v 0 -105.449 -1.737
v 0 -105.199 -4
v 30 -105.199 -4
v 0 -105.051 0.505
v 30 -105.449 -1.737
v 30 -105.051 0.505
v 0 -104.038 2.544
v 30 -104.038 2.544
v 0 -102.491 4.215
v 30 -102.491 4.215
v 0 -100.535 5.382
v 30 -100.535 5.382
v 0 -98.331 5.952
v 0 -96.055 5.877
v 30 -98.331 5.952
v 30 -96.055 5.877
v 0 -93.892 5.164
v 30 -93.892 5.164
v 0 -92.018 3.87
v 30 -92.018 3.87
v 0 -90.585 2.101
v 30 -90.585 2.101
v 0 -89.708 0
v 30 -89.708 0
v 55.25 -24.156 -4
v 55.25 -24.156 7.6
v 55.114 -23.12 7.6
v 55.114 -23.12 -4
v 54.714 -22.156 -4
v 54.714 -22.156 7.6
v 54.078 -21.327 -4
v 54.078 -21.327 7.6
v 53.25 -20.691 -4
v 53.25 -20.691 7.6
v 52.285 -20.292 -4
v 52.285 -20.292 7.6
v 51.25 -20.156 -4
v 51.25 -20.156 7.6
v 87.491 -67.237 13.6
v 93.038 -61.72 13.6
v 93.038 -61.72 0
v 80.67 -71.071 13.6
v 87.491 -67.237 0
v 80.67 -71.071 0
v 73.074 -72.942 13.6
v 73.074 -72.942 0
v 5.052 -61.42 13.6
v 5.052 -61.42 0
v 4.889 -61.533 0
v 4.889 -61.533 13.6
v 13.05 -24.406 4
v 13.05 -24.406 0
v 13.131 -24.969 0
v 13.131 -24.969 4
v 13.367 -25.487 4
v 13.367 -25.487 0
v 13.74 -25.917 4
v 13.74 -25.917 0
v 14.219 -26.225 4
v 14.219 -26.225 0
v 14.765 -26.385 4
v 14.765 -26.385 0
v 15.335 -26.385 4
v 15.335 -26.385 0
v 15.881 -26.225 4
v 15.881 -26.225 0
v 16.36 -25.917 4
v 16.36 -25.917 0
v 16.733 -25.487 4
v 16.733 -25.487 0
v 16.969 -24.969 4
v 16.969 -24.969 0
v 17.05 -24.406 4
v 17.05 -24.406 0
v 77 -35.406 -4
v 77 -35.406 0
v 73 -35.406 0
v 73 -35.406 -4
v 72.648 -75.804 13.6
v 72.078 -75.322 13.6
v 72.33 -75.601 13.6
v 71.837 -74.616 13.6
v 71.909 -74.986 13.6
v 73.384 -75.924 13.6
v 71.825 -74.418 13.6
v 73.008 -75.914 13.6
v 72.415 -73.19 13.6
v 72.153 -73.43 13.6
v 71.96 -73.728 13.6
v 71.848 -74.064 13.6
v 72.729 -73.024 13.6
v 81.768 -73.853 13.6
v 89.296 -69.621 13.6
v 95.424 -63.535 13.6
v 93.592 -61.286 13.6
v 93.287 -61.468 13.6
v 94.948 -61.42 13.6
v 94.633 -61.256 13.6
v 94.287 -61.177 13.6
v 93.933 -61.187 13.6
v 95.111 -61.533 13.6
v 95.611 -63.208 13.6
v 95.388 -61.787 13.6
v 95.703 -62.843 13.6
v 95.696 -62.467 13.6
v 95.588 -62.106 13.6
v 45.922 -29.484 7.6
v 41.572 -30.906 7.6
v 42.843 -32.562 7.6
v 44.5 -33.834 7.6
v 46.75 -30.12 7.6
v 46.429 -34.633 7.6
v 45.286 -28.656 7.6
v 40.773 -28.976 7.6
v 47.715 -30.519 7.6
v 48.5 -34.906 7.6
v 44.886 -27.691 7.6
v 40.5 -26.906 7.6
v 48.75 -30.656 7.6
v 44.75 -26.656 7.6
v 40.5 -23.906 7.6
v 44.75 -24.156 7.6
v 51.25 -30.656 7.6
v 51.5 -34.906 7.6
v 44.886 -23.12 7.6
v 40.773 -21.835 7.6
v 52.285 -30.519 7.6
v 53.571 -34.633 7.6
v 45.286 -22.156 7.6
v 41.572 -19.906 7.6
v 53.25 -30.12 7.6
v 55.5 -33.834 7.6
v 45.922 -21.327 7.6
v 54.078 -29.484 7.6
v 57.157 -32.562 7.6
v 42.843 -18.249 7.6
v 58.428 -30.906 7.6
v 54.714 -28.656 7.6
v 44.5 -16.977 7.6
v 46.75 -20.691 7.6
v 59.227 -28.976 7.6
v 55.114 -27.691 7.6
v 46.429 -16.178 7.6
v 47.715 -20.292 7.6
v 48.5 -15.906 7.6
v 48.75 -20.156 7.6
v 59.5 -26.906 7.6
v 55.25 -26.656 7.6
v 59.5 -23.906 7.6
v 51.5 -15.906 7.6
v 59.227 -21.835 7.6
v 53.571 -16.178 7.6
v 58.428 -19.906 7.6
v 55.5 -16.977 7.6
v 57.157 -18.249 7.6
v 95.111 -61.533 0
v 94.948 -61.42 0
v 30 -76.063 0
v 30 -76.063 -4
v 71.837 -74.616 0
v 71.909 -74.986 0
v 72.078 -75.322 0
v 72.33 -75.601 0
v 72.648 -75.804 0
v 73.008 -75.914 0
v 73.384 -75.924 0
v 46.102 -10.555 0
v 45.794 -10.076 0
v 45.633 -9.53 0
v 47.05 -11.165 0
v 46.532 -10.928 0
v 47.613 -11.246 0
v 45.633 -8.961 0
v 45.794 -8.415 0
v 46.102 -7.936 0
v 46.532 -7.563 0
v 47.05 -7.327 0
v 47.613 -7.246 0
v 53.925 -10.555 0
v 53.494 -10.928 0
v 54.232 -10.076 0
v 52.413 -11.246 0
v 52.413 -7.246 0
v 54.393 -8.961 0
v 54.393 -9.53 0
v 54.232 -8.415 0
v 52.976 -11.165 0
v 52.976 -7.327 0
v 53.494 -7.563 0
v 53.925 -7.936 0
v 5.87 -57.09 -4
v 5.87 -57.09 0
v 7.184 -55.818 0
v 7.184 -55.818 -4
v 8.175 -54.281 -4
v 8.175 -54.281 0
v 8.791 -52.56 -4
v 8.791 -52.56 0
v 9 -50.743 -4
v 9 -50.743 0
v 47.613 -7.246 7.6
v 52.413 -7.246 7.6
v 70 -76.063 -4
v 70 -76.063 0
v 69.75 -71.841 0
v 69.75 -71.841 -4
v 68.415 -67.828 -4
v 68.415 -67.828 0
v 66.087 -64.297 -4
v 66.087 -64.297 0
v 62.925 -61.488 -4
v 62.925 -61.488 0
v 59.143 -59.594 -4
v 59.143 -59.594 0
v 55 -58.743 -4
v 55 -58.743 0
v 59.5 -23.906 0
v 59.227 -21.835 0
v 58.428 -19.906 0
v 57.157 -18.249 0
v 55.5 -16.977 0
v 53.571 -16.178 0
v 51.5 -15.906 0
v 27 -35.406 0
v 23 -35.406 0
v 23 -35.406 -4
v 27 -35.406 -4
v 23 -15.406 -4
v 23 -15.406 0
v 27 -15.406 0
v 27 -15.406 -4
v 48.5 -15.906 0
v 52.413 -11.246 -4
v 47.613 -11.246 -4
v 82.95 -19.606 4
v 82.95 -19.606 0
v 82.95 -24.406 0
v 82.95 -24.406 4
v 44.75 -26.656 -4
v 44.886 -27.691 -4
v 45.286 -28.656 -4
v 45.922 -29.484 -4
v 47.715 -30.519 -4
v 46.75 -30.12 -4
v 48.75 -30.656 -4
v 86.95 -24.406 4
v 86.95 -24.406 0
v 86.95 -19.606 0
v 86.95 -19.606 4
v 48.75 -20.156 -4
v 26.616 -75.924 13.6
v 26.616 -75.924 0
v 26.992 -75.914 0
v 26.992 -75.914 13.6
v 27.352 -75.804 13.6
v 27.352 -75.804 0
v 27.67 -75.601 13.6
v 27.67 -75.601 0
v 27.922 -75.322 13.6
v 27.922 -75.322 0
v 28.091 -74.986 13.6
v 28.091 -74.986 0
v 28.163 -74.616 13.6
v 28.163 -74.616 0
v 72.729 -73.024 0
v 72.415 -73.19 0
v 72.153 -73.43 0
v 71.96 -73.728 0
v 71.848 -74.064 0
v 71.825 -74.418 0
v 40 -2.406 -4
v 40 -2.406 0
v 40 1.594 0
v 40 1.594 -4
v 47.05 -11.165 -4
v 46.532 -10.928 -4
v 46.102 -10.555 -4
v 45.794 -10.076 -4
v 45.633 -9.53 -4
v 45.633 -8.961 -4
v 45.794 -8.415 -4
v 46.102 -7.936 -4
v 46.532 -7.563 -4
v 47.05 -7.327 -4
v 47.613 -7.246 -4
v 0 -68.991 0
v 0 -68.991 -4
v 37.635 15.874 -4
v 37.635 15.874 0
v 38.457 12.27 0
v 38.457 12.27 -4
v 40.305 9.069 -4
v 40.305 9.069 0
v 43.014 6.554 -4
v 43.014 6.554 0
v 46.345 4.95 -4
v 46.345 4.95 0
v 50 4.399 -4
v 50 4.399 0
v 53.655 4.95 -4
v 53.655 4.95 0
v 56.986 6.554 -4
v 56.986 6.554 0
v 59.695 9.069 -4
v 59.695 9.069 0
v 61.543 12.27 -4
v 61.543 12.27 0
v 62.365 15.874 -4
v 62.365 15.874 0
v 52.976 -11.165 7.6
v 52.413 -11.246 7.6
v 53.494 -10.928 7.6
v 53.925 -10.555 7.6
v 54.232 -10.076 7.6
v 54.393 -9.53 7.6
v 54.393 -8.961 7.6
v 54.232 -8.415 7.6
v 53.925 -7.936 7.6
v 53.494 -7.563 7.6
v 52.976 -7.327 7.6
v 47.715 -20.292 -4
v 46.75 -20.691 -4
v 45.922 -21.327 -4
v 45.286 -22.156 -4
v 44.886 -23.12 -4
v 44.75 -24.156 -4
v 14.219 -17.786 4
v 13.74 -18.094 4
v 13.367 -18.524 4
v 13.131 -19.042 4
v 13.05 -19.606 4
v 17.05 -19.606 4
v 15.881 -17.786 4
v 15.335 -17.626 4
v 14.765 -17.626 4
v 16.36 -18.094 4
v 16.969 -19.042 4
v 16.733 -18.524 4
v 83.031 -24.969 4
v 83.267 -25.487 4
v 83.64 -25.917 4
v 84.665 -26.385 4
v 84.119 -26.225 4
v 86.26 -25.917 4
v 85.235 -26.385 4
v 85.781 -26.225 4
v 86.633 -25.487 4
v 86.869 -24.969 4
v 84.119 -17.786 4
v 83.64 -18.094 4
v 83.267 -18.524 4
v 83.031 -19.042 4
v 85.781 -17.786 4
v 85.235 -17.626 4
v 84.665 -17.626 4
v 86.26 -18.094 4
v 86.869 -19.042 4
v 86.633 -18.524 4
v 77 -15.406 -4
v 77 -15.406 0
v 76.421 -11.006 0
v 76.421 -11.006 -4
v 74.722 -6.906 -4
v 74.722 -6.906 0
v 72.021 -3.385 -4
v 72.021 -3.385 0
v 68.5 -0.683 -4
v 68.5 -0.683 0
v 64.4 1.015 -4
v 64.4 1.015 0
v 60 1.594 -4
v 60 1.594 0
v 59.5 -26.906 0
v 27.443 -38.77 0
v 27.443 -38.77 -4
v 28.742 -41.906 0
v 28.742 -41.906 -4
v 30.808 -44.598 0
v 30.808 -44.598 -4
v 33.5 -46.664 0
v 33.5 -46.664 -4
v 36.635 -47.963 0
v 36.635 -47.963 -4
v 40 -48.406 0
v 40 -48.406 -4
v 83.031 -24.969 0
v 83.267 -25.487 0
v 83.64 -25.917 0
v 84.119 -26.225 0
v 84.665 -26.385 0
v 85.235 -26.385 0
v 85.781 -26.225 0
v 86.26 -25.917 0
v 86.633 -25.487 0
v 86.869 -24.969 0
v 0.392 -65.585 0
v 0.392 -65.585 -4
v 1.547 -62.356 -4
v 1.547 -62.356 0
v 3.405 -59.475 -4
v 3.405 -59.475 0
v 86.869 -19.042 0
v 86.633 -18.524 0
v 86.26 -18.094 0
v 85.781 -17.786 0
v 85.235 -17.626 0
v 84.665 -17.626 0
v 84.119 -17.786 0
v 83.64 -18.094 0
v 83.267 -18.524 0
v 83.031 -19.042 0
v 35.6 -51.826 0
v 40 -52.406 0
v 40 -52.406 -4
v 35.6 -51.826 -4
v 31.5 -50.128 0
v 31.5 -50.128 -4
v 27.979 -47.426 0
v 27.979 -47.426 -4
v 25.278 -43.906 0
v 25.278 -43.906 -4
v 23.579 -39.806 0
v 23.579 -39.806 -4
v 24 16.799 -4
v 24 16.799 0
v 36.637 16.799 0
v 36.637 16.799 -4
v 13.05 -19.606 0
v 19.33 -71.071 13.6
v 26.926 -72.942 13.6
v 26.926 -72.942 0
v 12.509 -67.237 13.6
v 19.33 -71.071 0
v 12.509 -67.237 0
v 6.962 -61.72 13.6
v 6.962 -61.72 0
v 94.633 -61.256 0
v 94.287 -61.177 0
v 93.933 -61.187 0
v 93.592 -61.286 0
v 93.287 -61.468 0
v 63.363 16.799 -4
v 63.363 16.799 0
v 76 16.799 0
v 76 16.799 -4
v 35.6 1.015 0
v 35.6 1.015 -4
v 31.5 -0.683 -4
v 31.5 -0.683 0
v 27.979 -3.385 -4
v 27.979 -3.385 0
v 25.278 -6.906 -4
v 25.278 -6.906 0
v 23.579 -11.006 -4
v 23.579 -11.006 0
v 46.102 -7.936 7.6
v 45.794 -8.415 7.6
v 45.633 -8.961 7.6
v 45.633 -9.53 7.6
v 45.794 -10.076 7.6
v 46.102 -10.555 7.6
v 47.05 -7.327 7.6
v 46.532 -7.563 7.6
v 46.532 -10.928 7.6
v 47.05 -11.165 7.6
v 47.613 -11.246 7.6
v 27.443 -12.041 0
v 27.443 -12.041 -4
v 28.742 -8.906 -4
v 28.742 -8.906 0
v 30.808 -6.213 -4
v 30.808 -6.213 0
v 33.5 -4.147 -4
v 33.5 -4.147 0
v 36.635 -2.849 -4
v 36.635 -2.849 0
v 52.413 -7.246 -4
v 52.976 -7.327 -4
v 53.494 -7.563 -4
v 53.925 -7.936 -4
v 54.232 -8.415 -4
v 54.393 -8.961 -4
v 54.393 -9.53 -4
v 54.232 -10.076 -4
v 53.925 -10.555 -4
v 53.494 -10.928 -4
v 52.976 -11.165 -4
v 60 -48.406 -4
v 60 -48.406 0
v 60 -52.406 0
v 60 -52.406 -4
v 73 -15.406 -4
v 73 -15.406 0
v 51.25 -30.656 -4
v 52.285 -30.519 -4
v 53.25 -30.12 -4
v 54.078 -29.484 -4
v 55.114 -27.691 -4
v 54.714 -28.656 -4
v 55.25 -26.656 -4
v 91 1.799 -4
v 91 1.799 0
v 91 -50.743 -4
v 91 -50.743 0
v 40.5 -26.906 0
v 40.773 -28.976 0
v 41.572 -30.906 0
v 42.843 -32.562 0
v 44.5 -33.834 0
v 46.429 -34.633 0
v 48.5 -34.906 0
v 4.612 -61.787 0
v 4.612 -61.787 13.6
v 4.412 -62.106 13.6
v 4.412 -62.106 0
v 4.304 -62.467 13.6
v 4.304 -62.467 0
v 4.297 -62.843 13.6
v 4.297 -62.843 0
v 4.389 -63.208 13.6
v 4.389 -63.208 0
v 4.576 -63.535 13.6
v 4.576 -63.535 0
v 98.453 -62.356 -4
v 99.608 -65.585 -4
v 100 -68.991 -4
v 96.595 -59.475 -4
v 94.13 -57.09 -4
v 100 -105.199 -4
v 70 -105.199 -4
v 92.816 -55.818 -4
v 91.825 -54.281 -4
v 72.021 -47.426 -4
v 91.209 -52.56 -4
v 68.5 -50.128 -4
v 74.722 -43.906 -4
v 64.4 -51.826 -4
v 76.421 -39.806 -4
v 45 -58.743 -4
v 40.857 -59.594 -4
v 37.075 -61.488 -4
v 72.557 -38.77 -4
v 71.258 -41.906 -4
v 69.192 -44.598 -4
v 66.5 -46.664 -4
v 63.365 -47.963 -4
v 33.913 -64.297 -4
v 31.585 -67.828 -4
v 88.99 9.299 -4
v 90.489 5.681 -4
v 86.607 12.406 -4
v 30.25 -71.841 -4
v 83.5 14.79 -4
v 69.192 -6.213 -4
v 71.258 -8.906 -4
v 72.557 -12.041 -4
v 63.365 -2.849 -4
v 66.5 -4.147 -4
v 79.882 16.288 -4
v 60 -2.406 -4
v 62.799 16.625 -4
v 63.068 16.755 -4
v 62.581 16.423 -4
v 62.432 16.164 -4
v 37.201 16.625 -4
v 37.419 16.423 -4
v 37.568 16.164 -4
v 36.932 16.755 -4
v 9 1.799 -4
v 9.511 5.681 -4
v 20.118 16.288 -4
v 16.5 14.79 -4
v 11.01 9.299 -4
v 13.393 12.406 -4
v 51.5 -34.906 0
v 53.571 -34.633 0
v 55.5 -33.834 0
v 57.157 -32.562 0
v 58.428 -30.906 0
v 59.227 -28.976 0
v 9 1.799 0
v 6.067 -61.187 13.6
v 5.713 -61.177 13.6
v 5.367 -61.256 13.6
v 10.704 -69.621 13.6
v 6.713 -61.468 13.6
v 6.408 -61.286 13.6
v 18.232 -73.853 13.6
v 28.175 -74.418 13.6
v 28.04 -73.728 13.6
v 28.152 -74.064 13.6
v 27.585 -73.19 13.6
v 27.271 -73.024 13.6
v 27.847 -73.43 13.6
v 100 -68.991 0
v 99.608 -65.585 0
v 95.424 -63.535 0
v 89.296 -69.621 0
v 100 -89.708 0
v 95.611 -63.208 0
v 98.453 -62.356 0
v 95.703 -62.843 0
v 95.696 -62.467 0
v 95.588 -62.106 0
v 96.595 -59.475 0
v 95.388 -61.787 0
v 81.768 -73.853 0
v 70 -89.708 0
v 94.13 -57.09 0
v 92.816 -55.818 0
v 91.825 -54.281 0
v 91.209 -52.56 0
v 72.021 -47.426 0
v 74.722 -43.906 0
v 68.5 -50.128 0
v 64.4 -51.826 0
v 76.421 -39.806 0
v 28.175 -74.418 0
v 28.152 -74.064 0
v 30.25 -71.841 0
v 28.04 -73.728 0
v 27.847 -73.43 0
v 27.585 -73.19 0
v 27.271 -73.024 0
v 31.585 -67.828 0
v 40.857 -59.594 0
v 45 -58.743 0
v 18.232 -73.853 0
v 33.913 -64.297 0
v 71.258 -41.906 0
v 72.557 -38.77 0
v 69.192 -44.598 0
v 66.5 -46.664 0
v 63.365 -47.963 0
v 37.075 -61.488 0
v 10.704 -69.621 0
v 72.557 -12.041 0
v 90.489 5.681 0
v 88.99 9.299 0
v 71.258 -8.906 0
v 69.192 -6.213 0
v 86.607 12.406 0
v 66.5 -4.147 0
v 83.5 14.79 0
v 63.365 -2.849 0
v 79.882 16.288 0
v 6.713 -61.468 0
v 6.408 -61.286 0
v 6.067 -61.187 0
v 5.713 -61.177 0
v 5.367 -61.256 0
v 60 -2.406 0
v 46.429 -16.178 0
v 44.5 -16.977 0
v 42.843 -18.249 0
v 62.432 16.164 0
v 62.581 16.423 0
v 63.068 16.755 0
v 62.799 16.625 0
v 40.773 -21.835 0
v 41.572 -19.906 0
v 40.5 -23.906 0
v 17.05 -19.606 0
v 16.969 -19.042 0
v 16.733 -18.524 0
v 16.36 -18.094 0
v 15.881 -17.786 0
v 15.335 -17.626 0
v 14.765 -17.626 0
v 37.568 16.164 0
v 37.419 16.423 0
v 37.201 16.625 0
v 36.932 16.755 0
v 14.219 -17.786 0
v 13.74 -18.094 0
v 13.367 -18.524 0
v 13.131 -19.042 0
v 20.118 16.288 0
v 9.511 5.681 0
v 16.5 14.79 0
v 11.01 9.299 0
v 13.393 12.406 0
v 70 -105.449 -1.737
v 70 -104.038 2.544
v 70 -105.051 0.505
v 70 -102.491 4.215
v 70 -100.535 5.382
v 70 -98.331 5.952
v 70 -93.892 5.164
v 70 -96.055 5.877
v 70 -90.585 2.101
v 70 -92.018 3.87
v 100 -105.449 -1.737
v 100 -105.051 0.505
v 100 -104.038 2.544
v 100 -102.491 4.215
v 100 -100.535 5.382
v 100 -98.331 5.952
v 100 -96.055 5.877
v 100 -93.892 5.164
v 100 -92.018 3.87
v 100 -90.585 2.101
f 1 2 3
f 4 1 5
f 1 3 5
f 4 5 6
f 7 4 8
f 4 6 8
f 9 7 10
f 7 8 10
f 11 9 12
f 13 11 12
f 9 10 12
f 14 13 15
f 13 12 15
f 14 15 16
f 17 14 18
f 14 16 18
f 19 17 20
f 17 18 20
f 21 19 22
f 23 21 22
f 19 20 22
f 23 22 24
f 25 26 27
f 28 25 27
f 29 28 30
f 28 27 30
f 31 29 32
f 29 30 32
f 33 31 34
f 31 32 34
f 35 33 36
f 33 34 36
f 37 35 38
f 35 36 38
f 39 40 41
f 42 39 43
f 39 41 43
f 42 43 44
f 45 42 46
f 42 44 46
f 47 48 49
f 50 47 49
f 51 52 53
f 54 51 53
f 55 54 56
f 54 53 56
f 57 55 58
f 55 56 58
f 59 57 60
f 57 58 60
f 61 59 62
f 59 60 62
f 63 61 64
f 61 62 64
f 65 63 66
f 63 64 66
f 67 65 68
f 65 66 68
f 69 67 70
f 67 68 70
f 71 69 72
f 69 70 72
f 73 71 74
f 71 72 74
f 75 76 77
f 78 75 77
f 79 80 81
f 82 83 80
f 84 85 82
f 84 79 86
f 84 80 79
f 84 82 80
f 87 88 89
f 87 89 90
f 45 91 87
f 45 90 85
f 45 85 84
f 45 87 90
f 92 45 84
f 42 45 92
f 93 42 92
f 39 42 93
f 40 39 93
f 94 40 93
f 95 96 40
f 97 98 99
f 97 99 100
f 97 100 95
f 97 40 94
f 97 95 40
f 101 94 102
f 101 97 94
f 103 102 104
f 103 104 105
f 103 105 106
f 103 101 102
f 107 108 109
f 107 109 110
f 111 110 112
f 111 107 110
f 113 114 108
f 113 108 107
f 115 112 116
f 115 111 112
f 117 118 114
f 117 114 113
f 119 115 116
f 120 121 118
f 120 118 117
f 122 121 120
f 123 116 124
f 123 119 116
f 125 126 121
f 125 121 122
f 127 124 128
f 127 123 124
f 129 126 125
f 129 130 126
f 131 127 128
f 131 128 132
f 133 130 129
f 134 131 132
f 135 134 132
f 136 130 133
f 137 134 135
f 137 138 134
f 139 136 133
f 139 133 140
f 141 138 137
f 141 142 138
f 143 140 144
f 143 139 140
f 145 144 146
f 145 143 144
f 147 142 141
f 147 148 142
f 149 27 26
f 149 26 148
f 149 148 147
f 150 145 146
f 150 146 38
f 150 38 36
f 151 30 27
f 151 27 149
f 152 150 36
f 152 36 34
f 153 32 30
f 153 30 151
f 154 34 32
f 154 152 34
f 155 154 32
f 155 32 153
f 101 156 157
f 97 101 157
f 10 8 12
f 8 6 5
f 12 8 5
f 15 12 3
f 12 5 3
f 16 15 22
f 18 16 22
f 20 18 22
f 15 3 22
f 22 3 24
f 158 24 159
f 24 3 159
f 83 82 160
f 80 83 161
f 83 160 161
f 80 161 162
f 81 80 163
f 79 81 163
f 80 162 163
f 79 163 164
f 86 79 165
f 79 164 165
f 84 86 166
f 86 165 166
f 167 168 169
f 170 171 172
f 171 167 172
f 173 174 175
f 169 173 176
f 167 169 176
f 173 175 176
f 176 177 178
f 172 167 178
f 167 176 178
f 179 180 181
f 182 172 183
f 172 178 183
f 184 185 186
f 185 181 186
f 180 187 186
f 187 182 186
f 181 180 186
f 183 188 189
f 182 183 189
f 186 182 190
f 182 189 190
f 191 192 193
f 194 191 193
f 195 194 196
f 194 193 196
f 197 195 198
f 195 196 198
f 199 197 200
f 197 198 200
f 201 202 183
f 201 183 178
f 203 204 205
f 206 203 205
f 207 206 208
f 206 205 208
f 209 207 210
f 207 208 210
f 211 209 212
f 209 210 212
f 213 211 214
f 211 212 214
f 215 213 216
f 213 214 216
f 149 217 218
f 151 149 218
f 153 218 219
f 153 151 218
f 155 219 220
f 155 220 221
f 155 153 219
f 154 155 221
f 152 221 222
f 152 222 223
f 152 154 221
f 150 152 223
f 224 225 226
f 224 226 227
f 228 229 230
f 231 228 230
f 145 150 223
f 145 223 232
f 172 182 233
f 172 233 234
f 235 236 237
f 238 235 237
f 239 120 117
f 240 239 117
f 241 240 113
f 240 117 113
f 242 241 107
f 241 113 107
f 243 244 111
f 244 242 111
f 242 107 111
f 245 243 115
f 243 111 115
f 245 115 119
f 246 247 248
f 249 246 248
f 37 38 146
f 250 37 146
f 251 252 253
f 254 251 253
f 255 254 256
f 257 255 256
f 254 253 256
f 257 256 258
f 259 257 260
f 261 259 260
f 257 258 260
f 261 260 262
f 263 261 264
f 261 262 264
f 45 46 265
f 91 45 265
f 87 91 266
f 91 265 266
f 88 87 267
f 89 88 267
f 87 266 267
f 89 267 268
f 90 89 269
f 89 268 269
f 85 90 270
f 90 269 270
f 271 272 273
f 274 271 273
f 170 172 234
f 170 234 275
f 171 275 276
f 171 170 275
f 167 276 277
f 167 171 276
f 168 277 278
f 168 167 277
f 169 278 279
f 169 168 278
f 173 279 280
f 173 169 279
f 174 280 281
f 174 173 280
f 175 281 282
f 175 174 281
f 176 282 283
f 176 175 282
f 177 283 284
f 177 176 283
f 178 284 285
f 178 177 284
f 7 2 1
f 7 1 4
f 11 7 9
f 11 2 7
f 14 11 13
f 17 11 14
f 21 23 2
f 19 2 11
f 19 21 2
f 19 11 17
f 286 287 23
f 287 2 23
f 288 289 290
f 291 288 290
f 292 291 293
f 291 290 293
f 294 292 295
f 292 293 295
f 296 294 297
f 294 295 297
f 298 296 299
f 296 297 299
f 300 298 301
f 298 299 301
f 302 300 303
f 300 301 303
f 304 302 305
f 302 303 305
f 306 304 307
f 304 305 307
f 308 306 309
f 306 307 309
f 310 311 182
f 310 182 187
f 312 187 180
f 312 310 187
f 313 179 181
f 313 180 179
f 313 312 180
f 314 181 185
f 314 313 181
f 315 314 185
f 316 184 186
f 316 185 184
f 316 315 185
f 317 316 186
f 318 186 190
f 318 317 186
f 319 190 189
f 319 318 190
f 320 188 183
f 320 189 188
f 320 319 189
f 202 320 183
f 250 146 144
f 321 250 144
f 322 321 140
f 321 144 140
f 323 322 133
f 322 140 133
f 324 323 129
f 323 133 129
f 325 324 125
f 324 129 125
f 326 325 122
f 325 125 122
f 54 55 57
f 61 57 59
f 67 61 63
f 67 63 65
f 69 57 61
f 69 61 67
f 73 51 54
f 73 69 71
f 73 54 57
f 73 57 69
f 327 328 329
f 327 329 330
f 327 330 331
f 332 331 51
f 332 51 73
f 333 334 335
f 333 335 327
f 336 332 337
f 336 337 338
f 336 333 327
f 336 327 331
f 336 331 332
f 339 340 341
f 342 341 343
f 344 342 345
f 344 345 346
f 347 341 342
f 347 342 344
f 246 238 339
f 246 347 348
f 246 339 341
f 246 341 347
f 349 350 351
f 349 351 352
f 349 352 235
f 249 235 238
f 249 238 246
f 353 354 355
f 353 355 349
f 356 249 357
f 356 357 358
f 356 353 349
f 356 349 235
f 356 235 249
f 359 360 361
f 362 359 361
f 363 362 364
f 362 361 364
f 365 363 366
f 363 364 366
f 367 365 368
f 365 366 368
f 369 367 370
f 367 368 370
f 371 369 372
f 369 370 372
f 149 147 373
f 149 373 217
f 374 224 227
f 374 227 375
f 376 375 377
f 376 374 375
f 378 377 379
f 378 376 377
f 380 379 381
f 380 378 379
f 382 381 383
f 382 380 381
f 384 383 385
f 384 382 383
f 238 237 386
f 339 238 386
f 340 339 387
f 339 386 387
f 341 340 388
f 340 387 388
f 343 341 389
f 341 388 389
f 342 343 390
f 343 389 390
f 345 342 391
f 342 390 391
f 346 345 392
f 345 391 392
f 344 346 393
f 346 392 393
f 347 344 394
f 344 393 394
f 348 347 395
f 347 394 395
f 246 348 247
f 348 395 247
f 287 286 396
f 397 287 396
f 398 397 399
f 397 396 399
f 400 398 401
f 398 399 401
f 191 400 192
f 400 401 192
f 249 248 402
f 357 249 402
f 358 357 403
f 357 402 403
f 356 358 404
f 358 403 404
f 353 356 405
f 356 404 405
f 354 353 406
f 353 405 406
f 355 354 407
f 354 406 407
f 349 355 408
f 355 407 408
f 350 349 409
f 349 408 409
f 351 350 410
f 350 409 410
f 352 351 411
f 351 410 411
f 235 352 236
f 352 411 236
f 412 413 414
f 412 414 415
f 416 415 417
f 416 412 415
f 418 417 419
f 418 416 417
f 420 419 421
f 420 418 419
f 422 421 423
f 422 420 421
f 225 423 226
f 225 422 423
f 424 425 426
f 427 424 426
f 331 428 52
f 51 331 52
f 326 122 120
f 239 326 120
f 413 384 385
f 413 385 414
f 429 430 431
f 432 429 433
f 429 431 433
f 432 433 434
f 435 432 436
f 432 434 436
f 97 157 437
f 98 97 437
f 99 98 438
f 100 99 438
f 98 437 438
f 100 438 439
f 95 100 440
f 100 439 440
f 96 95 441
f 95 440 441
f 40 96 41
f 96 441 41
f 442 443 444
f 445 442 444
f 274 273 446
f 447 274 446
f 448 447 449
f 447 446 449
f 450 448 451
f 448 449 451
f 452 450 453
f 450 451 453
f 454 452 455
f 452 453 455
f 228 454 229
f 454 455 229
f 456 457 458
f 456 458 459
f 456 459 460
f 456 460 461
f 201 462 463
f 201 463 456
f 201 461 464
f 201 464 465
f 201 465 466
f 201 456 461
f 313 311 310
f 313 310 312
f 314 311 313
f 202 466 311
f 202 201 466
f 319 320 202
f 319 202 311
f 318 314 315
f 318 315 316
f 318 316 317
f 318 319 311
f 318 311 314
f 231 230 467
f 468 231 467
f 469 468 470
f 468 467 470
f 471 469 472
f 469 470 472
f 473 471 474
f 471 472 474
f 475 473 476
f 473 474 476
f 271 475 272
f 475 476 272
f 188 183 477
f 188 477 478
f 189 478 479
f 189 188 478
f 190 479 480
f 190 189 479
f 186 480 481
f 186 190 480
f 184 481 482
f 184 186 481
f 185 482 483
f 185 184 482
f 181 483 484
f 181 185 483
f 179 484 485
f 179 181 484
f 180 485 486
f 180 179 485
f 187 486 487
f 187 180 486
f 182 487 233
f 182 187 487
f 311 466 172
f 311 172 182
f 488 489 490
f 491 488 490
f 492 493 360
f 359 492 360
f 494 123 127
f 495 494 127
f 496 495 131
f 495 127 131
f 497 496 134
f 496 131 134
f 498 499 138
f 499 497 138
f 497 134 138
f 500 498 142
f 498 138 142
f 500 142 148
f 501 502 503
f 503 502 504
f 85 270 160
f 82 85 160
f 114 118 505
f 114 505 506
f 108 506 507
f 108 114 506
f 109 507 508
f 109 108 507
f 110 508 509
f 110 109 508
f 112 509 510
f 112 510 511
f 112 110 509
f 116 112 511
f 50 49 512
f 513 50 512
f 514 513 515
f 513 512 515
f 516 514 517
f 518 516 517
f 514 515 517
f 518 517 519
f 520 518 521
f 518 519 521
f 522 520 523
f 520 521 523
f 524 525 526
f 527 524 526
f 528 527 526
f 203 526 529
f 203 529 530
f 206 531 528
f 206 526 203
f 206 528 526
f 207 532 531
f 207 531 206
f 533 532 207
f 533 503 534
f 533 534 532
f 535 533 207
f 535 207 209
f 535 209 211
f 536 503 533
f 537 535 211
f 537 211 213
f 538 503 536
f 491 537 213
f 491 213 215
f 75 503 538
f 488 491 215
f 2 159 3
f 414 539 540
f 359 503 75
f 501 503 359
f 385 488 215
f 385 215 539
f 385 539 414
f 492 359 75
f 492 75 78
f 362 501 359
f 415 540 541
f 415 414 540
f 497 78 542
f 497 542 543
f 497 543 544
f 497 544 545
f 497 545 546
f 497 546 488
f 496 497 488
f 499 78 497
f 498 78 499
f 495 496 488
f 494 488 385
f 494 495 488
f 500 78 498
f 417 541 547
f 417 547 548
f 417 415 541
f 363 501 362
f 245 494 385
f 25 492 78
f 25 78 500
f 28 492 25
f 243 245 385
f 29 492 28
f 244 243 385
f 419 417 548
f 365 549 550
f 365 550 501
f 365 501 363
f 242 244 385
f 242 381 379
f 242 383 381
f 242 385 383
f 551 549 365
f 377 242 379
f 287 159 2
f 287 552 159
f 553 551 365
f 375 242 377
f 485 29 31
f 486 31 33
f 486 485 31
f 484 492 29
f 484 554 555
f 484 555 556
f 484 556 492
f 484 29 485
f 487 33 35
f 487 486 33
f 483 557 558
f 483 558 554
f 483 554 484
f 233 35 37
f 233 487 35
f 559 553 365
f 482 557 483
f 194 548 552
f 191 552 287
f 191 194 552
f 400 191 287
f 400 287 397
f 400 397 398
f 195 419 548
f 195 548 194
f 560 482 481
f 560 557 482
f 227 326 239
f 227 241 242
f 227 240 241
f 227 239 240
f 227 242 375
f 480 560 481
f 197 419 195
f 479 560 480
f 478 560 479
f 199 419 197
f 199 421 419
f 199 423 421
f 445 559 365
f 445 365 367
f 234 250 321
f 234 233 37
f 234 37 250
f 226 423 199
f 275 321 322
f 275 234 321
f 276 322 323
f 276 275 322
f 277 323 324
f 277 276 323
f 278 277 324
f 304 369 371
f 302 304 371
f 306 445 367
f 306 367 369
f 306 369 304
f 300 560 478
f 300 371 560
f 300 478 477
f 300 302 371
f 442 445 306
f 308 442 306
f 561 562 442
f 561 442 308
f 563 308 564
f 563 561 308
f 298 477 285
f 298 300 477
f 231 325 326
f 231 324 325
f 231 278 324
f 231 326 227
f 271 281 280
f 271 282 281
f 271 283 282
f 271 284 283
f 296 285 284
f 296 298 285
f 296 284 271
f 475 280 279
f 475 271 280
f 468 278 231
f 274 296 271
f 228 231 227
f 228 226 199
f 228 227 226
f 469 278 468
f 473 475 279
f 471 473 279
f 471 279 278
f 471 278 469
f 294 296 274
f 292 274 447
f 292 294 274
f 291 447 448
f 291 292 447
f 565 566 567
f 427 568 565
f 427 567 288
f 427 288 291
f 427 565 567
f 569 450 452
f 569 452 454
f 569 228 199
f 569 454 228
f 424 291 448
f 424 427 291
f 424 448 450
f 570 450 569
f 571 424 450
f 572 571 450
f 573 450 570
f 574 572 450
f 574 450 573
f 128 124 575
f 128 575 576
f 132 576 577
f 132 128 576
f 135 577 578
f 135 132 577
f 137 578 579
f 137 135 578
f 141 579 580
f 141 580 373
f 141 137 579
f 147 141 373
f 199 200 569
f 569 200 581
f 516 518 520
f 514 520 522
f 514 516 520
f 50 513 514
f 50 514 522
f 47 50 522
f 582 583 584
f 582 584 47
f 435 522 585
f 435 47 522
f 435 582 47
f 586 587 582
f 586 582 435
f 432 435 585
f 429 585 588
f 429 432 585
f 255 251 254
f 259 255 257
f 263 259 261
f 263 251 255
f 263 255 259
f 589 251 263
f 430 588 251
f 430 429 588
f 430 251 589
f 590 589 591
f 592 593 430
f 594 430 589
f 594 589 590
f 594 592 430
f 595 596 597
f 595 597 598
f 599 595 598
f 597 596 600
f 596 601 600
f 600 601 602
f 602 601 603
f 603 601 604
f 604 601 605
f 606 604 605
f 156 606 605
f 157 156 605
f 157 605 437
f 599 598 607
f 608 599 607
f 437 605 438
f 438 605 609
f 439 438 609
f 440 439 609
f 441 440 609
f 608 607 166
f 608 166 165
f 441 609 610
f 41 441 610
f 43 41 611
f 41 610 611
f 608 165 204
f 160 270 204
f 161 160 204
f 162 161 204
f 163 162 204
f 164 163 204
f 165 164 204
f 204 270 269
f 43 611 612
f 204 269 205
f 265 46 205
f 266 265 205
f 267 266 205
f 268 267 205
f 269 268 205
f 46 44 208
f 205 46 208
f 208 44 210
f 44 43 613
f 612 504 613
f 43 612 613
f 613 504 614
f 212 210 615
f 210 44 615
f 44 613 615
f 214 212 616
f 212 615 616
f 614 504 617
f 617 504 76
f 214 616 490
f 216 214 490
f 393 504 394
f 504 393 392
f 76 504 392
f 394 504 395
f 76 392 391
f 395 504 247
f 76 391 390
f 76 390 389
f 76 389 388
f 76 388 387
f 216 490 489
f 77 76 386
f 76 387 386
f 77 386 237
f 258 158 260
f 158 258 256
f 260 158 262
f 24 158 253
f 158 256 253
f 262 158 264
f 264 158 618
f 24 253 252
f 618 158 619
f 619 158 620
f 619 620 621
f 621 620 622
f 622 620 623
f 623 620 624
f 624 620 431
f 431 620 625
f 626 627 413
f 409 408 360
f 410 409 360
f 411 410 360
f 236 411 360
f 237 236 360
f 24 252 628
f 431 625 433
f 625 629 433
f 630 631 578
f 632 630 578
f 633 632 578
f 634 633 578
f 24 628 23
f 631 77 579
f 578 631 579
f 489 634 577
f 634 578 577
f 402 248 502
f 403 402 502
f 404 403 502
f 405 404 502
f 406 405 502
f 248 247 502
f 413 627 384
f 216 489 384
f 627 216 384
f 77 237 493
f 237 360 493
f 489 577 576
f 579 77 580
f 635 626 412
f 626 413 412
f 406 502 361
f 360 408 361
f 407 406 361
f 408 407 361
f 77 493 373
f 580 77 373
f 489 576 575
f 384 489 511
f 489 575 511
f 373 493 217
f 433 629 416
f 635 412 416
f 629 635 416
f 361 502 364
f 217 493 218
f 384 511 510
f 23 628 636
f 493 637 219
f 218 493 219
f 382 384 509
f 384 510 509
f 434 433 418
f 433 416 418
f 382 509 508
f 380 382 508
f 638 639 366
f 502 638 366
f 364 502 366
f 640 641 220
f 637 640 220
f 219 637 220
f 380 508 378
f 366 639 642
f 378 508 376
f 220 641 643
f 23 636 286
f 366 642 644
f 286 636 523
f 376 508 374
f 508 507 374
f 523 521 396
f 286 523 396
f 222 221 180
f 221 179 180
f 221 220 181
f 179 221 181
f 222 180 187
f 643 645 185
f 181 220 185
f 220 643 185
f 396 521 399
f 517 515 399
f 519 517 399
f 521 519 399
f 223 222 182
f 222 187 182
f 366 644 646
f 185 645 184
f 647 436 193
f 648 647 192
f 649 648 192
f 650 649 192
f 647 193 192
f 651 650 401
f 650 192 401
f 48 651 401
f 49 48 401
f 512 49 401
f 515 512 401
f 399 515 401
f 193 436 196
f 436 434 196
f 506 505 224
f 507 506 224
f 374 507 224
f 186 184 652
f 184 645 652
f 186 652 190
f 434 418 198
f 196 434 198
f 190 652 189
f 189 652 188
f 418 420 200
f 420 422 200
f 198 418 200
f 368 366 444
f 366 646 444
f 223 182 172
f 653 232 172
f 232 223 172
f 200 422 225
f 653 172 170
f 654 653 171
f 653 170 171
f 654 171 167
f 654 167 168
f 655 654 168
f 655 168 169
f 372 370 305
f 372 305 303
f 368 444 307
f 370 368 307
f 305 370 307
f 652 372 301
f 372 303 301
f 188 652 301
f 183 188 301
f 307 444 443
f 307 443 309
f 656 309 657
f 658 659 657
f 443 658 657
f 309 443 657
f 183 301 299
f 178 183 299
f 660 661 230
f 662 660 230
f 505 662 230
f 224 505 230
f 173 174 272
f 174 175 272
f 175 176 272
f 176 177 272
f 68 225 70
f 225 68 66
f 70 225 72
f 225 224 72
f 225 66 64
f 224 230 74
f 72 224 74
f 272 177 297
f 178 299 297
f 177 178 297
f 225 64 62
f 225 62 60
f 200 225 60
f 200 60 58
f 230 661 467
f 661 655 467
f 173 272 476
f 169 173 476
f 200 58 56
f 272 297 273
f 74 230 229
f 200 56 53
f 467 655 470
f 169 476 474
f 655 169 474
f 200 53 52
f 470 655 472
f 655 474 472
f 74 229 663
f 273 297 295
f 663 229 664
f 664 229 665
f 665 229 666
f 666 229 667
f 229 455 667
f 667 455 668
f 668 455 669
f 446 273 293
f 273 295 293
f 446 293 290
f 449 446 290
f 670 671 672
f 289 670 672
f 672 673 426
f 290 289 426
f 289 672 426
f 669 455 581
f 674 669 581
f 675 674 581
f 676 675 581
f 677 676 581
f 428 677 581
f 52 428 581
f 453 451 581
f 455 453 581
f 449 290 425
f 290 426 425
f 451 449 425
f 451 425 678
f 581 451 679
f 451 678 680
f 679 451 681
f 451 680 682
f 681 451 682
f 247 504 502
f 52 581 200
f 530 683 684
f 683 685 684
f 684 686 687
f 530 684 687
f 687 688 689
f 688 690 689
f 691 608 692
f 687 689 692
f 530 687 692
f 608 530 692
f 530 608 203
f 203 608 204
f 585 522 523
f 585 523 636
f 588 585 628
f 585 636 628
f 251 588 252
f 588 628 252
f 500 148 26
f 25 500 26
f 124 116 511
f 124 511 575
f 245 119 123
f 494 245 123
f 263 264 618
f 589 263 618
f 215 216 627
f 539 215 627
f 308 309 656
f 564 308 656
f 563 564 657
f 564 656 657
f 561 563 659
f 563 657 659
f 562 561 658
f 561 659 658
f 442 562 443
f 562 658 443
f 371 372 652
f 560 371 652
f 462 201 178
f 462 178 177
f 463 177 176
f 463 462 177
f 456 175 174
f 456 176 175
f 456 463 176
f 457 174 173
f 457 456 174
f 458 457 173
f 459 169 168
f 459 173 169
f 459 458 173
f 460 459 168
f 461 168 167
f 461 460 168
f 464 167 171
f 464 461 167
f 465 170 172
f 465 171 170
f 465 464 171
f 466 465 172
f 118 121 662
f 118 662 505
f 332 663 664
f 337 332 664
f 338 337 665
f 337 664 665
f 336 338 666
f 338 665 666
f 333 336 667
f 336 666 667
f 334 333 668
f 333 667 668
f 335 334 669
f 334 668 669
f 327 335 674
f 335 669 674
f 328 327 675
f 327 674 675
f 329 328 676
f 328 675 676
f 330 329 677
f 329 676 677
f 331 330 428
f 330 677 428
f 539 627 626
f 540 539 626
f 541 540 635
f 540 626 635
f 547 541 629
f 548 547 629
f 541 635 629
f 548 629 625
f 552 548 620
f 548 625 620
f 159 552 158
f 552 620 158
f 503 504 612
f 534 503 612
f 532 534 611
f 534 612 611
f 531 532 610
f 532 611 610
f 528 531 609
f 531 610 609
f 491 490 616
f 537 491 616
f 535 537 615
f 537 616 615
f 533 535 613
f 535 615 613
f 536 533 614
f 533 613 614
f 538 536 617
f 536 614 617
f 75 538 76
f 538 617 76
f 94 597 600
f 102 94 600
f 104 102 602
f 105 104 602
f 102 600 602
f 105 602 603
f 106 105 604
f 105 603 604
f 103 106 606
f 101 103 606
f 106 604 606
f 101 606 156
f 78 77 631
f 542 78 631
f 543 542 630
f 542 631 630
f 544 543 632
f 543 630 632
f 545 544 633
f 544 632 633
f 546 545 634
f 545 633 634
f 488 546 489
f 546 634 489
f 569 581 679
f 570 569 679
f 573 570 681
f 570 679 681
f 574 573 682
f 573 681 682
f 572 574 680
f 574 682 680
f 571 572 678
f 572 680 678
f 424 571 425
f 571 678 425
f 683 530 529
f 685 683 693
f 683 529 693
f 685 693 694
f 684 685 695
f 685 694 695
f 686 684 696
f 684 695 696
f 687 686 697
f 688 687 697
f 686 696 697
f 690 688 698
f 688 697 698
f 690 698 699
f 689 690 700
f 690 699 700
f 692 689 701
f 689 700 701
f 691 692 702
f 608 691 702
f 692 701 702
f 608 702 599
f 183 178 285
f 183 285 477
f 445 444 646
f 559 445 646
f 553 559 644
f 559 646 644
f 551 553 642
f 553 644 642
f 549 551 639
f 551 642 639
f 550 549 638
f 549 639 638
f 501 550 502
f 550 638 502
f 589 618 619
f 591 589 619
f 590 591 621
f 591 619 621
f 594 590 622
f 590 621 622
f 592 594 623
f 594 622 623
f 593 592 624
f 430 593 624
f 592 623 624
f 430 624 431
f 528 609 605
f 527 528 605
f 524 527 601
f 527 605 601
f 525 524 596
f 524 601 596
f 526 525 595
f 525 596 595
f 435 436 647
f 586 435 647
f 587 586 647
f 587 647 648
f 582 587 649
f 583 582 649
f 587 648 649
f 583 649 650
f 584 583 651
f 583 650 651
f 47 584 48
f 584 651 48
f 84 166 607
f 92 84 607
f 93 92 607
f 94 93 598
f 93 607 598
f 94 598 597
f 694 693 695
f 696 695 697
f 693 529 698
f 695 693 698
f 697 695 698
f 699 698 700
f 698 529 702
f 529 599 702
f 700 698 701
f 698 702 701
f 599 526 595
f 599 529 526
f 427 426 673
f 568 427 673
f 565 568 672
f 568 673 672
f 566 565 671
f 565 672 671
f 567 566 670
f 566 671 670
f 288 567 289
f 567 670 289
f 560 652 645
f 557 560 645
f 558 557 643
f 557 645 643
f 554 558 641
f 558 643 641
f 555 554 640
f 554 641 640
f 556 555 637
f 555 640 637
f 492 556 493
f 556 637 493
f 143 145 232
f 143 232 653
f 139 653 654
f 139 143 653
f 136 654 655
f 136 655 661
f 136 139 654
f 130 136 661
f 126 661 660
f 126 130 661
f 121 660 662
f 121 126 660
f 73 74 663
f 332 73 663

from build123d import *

# Parameters (mm, degrees)
BOSS_EXTRUDE1_DEPTH     = 4
BOSS_EXTRUDE5_DEPTH     = 100
CUT_EXTRUDE1_DEPTH      = 6
CUT_EXTRUDE1_DEPTH_BACK = 4
SKETCH10_W              = 40
SKETCH10_H              = 15.745966692
BOSS_EXTRUDE2_START     = 7.6
BOSS_EXTRUDE2_DEPTH     = 7.6
BOSS_EXTRUDE3_DEPTH     = 4
BOSS_EXTRUDE4_DEPTH     = 13.6


with BuildPart() as part:
    # Sketch5 → Boss-Extrude1 (new body)
    with BuildSketch(Plane.XY):
        with BuildLine():
            Line((24, 16.79919429), (36.637365529, 16.79919429))
            ThreePointArc((36.637365529, 16.79919429), (37.317576208, 16.532210956), (37.634577057, 15.873821155))
            ThreePointArc((37.634577057, 15.873821155), (50, 4.39919429), (62.365422943, 15.873821155))
            ThreePointArc((62.365422943, 15.873821155), (62.682423792, 16.532210956), (63.362634471, 16.79919429))
            Line((63.362634471, 16.79919429), (76, 16.79919429))
            ThreePointArc((76, 16.79919429), (86.606601718, 12.405796007), (91, 1.79919429))
            Line((91, 1.79919429), (91, -50.7428479))
            ThreePointArc((91, -50.7428479), (91.825164609, -54.281454563), (94.130434279, -57.09007798))
            ThreePointArc((94.130434279, -57.09007798), (98.452815572, -62.356247367), (100, -68.991135491))
            Line((100, -68.991135491), (100, -97.453476489))
            Line((100, -97.453476489), (70, -97.453476489))
            Line((70, -97.453476489), (70, -76.063355975))
            ThreePointArc((70, -76.063355975), (66.087194676, -64.29650022), (55, -58.7428479))
            Line((55, -58.7428479), (45, -58.7428479))
            ThreePointArc((45, -58.7428479), (33.912805324, -64.29650022), (30, -76.063355975))
            Line((30, -76.063355975), (30, -97.453476489))
            Line((30, -97.453476489), (0, -97.453476489))
            Line((0, -97.453476489), (0, -68.991135491))
            ThreePointArc((0, -68.991135491), (1.547183906, -62.356247464), (5.869565217, -57.090078366))
            ThreePointArc((5.869565217, -57.090078366), (8.17483525, -54.281454848), (9, -50.7428479))
            Line((9, -50.7428479), (9, 1.79919429))
            ThreePointArc((9, 1.79919429), (13.393398282, 12.405796007), (24, 16.79919429))
        make_face()
        with BuildLine():
            Line((23, -35.405583535), (27, -35.405583535))
            ThreePointArc((27, -35.405583535), (30.807611845, -44.59797169), (40, -48.405583535))
            Line((40, -48.405583535), (40, -52.405583535))
            ThreePointArc((40, -52.405583535), (27.97918472, -47.426398815), (23, -35.405583535))
        make_face(mode=Mode.SUBTRACT)
        with BuildLine():
            Line((60, -48.405583535), (60, -52.405583535))
            ThreePointArc((60, -52.405583535), (72.02081528, -47.426398815), (77, -35.405583535))
            Line((77, -35.405583535), (73, -35.405583535))
            ThreePointArc((73, -35.405583535), (69.192388155, -44.59797169), (60, -48.405583535))
        make_face(mode=Mode.SUBTRACT)
        with BuildLine():
            Line((73, -15.405583535), (77, -15.405583535))
            ThreePointArc((77, -15.405583535), (72.02081528, -3.384768255), (60, 1.594416465))
            Line((60, 1.594416465), (60, -2.405583535))
            ThreePointArc((60, -2.405583535), (69.192388155, -6.213195379), (73, -15.405583535))
        make_face(mode=Mode.SUBTRACT)
        with BuildLine():
            Line((40, -2.405583535), (40, 1.594416465))
            ThreePointArc((40, 1.594416465), (27.97918472, -3.384768255), (23, -15.405583535))
            Line((23, -15.405583535), (27, -15.405583535))
            ThreePointArc((27, -15.405583535), (30.807611845, -6.213195379), (40, -2.405583535))
        make_face(mode=Mode.SUBTRACT)
        with BuildLine():
            Line((48.75, -20.155583535), (51.25, -20.155583535))
            ThreePointArc((51.25, -20.155583535), (54.078427125, -21.32715641), (55.25, -24.155583535))
            Line((55.25, -24.155583535), (55.25, -26.655583535))
            ThreePointArc((55.25, -26.655583535), (54.078427125, -29.48401066), (51.25, -30.655583535))
            Line((51.25, -30.655583535), (48.75, -30.655583535))
            ThreePointArc((48.75, -30.655583535), (45.921572875, -29.48401066), (44.75, -26.655583535))
            Line((44.75, -26.655583535), (44.75, -24.155583535))
            ThreePointArc((44.75, -24.155583535), (45.921572875, -21.32715641), (48.75, -20.155583535))
        make_face(mode=Mode.SUBTRACT)
        with BuildLine():
            Line((47.613027863, -7.245609293), (52.413027863, -7.245609293))
            ThreePointArc((52.413027863, -7.245609293), (54.413027863, -9.245609293), (52.413027863, -11.245609293))
            Line((52.413027863, -11.245609293), (47.613027863, -11.245609293))
            ThreePointArc((47.613027863, -11.245609293), (45.613027863, -9.245609293), (47.613027863, -7.245609293))
        make_face(mode=Mode.SUBTRACT)
    extrude(amount=-BOSS_EXTRUDE1_DEPTH)

    # Sketch9 → Boss-Extrude5 (add)
    with BuildSketch(Plane(origin=(100, 0, 0), x_dir=(0, 0, -1), z_dir=(1, 0, 0))):
        with BuildLine():
            Line((0, -89.707509797), (0, -97.453476489))
            Line((0, -97.453476489), (4, -97.453476489))
            Line((4, -97.453476489), (4, -105.199443182))
            ThreePointArc((4, -105.199443182), (-5.745966692, -99.453476489), (0, -89.707509797))
        make_face()
    extrude(amount=-BOSS_EXTRUDE5_DEPTH)

    # Sketch10 → Cut-Extrude1 (cut, two sides: drawn at the far end of the back side and taken through both)
    with BuildSketch(Plane.XY.offset(-CUT_EXTRUDE1_DEPTH_BACK)):
        with Locations((50, -97.580493143)):
            Rectangle(SKETCH10_W, SKETCH10_H)
    extrude(amount=CUT_EXTRUDE1_DEPTH + CUT_EXTRUDE1_DEPTH_BACK, mode=Mode.SUBTRACT)

    # Sketch7 → Boss-Extrude2 (add)
    # profile 1 of 2: a face of its own
    with BuildSketch(Plane.XY.offset(BOSS_EXTRUDE2_START)):
        with BuildLine():
            Line((40.5, -23.905583535), (40.5, -26.905583535))
            ThreePointArc((40.5, -26.905583535), (42.843145751, -32.562437784), (48.5, -34.905583535))
            Line((48.5, -34.905583535), (51.5, -34.905583535))
            ThreePointArc((51.5, -34.905583535), (57.156854249, -32.562437784), (59.5, -26.905583535))
            Line((59.5, -26.905583535), (59.5, -23.905583535))
            ThreePointArc((59.5, -23.905583535), (57.156854249, -18.248729285), (51.5, -15.905583535))
            Line((51.5, -15.905583535), (48.5, -15.905583535))
            ThreePointArc((48.5, -15.905583535), (42.843145751, -18.248729285), (40.5, -23.905583535))
        make_face()
        with BuildLine():
            Line((44.75, -24.155583535), (44.75, -26.655583535))
            ThreePointArc((44.75, -26.655583535), (45.921572875, -29.48401066), (48.75, -30.655583535))
            Line((48.75, -30.655583535), (51.25, -30.655583535))
            ThreePointArc((51.25, -30.655583535), (54.078427125, -29.48401066), (55.25, -26.655583535))
            Line((55.25, -26.655583535), (55.25, -24.155583535))
            ThreePointArc((55.25, -24.155583535), (54.078427125, -21.32715641), (51.25, -20.155583535))
            Line((51.25, -20.155583535), (48.75, -20.155583535))
            ThreePointArc((48.75, -20.155583535), (45.921572875, -21.32715641), (44.75, -24.155583535))
        make_face(mode=Mode.SUBTRACT)
    # profile 2 of 2: a face of its own
    with BuildSketch(Plane.XY.offset(BOSS_EXTRUDE2_START)):
        with BuildLine():
            Line((47.613027863, -11.245609293), (52.413027863, -11.245609293))
            ThreePointArc((52.413027863, -11.245609293), (54.413027863, -9.245609293), (52.413027863, -7.245609293))
            Line((52.413027863, -7.245609293), (47.613027863, -7.245609293))
            ThreePointArc((47.613027863, -7.245609293), (45.613027863, -9.245609293), (47.613027863, -11.245609293))
        make_face()
    extrude(amount=-BOSS_EXTRUDE2_DEPTH)


with BuildPart() as boss_extrude2_piece_1:
    # of the separate pieces the step leaves, piece 1, a body of its own (boss_extrude2_pieces)
    add(part.part.solids().sort_by_distance((55, -58.7428479, 0))[0])

    # Sketch6 → Boss-Extrude3 (add)
    with BuildSketch(Plane.XY):
        with BuildLine():
            Line((13.05, -19.605583535), (13.05, -24.405583535))
            ThreePointArc((13.05, -24.405583535), (15.05, -26.405583535), (17.05, -24.405583535))
            Line((17.05, -24.405583535), (17.05, -19.605583535))
            ThreePointArc((17.05, -19.605583535), (15.05, -17.605583535), (13.05, -19.605583535))
        make_face()
        with BuildLine():
            Line((82.95, -19.605583535), (82.95, -24.405583535))
            ThreePointArc((82.95, -24.405583535), (84.95, -26.405583535), (86.95, -24.405583535))
            Line((86.95, -24.405583535), (86.95, -19.605583535))
            ThreePointArc((86.95, -19.605583535), (84.95, -17.605583535), (82.95, -19.605583535))
        make_face()
    extrude(amount=BOSS_EXTRUDE3_DEPTH)

    # Sketch8 → Boss-Extrude4 (add)
    with BuildSketch(Plane.XY):
        with BuildLine():
            Line((5.051952567, -61.420170717), (4.889119672, -61.533180939))
            ThreePointArc((4.889119672, -61.533180939), (4.304160695, -62.467013505), (4.576086991, -63.534850738))
            ThreePointArc((4.576086991, -63.534850738), (14.324723149, -71.991251845), (26.616139945, -75.924151508))
            ThreePointArc((26.616139945, -75.924151508), (27.669738102, -75.601426873), (28.163469962, -74.616313115))
            Line((28.163469962, -74.616313115), (28.175379043, -74.418464598))
            ThreePointArc((28.175379043, -74.418464598), (27.846661517, -73.430042168), (26.926294201, -72.942232658))
            ThreePointArc((26.926294201, -72.942232658), (15.789594598, -69.385306206), (6.962344462, -61.719964799))
            ThreePointArc((6.962344462, -61.719964799), (6.067224815, -61.187240734), (5.051952567, -61.420170717))
        make_face()
        with BuildLine():
            Line((71.824620957, -74.418464598), (71.836530038, -74.616313115))
            ThreePointArc((71.836530038, -74.616313115), (72.330261898, -75.601426873), (73.383860055, -75.924151508))
            ThreePointArc((73.383860055, -75.924151508), (85.675276851, -71.991251845), (95.423913009, -63.534850738))
            ThreePointArc((95.423913009, -63.534850738), (95.695839305, -62.467013505), (95.110880328, -61.533180939))
            Line((95.110880328, -61.533180939), (94.948047433, -61.420170717))
            ThreePointArc((94.948047433, -61.420170717), (93.932775185, -61.187240734), (93.037655538, -61.719964799))
            ThreePointArc((93.037655538, -61.719964799), (84.210405402, -69.385306206), (73.073705799, -72.942232658))
            ThreePointArc((73.073705799, -72.942232658), (72.153338483, -73.430042168), (71.824620957, -74.418464598))
        make_face()
    extrude(amount=BOSS_EXTRUDE4_DEPTH)


with BuildPart() as boss_extrude2_piece_2:
    # of the separate pieces the step leaves, piece 2, a body of its own (boss_extrude2_pieces)
    add(part.part.solids().sort_by_distance((47.613027863, -7.245609293, 7.6))[0])


solid = Compound([boss_extrude2_piece_1.part, boss_extrude2_piece_2.part])
